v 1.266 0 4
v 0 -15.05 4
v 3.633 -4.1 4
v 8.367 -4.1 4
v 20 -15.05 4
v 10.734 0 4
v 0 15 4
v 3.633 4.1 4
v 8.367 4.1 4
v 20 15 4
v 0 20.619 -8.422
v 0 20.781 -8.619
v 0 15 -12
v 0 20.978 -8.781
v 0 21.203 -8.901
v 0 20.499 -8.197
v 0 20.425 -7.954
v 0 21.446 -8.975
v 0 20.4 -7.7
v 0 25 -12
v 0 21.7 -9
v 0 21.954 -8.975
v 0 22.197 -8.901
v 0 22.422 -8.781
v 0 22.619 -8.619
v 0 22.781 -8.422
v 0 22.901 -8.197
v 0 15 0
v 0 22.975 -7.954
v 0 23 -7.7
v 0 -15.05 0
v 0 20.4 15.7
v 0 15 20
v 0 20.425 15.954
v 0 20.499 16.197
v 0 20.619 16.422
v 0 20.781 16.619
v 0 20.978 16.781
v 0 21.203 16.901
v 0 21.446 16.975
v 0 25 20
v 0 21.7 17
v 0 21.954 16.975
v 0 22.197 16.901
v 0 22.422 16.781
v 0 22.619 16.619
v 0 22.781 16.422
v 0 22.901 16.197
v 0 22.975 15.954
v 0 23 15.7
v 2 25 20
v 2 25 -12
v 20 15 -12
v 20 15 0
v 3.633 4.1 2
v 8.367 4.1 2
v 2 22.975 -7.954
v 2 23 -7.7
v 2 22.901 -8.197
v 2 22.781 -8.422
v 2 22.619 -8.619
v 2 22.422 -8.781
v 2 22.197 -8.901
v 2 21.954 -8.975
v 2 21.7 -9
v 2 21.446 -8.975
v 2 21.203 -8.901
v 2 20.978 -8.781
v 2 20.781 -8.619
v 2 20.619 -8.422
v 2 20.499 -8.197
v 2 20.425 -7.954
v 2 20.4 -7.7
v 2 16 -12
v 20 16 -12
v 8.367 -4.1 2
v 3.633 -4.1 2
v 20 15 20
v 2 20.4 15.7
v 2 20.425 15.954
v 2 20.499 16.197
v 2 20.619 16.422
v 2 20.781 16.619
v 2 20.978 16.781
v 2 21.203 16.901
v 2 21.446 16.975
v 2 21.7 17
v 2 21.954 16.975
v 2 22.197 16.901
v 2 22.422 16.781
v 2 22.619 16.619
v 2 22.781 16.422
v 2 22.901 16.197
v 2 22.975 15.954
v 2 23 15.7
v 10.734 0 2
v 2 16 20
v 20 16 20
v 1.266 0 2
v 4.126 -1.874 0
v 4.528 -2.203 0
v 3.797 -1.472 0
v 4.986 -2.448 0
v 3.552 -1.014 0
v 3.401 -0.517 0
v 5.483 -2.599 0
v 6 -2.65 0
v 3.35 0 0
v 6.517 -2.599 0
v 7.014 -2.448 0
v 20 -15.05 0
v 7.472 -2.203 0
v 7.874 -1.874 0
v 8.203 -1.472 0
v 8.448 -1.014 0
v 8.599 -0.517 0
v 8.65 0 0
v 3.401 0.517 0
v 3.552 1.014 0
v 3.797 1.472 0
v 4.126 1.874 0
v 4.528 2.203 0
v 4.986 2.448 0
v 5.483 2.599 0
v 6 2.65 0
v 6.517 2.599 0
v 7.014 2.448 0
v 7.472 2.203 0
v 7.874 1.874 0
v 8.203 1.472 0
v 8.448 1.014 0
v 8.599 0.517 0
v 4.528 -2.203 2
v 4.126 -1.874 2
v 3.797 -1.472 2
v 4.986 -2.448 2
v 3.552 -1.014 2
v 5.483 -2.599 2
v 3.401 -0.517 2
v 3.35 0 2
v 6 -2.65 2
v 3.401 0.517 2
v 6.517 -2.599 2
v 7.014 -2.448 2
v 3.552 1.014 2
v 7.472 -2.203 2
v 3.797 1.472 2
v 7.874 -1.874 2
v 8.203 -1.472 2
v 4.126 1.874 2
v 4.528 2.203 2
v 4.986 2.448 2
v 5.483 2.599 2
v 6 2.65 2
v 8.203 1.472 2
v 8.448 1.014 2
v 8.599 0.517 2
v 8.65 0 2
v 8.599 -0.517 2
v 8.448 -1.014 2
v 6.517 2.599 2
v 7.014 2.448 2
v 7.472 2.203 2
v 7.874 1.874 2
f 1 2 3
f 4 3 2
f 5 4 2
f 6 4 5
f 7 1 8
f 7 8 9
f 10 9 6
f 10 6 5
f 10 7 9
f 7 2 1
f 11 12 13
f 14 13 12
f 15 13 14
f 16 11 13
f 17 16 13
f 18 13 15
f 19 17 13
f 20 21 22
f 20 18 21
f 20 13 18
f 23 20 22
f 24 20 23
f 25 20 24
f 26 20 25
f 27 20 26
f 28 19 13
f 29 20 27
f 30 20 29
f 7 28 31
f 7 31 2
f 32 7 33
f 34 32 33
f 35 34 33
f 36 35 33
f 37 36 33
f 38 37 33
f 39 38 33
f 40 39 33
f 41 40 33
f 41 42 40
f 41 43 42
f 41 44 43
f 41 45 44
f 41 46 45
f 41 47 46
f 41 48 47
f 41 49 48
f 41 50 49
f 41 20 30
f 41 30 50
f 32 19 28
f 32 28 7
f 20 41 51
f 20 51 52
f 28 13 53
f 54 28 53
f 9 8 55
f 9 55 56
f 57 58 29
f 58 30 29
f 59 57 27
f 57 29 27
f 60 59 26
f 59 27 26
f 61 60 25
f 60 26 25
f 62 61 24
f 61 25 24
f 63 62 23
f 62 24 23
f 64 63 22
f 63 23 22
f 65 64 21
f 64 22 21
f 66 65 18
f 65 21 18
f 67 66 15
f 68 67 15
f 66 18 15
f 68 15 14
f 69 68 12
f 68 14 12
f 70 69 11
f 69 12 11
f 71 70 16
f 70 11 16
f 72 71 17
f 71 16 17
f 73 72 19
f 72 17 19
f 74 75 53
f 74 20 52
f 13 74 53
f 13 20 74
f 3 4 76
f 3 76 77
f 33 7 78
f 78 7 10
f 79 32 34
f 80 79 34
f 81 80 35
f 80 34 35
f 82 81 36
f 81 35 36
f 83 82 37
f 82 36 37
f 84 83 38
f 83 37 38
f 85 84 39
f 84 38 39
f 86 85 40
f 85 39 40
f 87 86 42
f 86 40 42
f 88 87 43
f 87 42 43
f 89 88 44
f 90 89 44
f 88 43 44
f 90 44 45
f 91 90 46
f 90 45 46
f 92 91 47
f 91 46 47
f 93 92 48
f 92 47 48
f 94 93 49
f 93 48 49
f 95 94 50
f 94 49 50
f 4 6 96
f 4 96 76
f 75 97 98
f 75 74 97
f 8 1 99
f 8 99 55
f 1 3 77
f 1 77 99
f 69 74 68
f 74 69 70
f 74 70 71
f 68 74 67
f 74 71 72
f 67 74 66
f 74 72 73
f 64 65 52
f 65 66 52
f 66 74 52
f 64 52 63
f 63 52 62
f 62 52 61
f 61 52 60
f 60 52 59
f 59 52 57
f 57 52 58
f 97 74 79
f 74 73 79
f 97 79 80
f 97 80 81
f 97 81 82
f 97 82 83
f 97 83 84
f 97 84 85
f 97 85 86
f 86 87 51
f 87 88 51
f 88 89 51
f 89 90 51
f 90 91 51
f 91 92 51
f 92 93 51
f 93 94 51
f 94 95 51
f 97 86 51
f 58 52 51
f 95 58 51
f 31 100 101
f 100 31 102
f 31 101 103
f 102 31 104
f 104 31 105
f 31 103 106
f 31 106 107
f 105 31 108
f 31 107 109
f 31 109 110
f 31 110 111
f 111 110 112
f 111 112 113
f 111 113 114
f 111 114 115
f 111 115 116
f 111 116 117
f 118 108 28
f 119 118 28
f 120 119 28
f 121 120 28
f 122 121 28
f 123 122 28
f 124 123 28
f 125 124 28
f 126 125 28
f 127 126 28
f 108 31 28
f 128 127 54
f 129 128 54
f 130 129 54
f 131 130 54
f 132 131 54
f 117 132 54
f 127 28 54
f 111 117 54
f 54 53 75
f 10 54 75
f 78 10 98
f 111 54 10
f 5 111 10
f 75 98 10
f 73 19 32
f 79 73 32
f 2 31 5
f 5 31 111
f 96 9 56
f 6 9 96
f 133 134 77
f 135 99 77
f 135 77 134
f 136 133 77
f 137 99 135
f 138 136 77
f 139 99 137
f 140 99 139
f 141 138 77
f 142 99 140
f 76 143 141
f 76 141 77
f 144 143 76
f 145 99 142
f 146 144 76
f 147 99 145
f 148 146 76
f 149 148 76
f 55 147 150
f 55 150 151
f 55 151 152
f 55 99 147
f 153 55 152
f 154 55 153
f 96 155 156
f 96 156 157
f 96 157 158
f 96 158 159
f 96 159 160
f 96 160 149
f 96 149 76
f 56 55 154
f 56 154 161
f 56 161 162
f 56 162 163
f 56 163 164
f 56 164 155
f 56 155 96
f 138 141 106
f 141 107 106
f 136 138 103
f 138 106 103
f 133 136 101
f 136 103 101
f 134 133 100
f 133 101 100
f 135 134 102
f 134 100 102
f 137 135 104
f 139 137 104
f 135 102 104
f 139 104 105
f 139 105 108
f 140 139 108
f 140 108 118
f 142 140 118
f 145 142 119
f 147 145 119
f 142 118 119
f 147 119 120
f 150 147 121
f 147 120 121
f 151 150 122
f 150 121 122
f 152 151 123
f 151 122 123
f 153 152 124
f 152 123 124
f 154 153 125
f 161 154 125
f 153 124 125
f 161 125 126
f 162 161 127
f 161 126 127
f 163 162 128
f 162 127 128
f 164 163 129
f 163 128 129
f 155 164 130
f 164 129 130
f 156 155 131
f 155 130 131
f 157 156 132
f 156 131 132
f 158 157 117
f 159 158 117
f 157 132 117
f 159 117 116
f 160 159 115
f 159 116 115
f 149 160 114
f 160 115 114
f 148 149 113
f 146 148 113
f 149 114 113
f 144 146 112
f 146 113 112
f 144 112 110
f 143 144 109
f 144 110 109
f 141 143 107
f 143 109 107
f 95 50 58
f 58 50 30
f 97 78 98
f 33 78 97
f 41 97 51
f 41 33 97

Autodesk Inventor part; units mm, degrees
ref_plane "YZ Plane" through (0, 0, 0) normal (1, 0, 0) x (0, 1, 0)
ref_plane "XY Plane" through (0, 0, 0) normal (0, 0, 1) x (1, 0, 0)
ref_plane "MountingScrew" through (0, 0, 0) normal (0, 1, 0) x (-1, 0, 0)
ref_plane "Bracketheight" through (0, 15, 0) normal (0, 1, 0) x (-1, 0, 0)
sketch "Sketch1" plane through (0, 0, 0) normal (0, 0, 1) x (1, 0, 0)
  line L0 (0, -15.05) -> (20, -15.05)
  line L1 (20, -15.05) -> (20, 15)
  line L2 (20, 15) -> (0, 15)
  line L3 (0, 15) -> (0, -15.05)
  circle A0 centre (6, 0) radius 2.75 construction
  line L4 (0, -2.75) -> (20, -2.75) construction
  line L5 (3.25, 15) -> (3.25, -15.05) construction
  line L6 (-4, 0) -> (24, 0) construction
  line L7 (0, 21.01) -> (0, -21.06) construction
  line L8 (-4, 15) -> (24, 15) construction
  dimension "d0" = 5.5
  dimension "d1" = 12.3
  dimension "d2" = 3.25
  dimension "d31" = 6
  dimension "d36" = 20
extrude "Extrusion1" add sketch "Sketch1" along normal blind 4
sketch "Sketch2" plane through (0, 0, 4) normal (0, 0, 1) x (1, 0, 0)
  point P0 (0, 0)
  point P1 (6, 0)
hole "Hole1" at (6, 0, 4) direction (0, 0, -1) diameter 5.3 end through all clearance for "Socket Head Cap Screw ISO 4762" size "M5" standard "ISO"
sketch "Sketch5" plane through (0, 15, 0) normal (0, 1, 0) x (1, 0, 0)
  line L0 (0, 12) -> (20, 12)
  line L1 (20, 12) -> (20, -20)
  line L2 (20, -20) -> (0, -20)
  line L3 (0, -20) -> (0, 12)
  line L4 (20, 0) -> (0, 0) construction
  line L5 (20, 0) -> (0, 0) construction
  line L6 (0, 0) -> (0, -4) construction
  line L7 (20, 0) -> (20, -4) construction
  dimension "d2" = 3.25
  dimension "d60" = 20
  dimension "d61" = 12
extrude "Extrusion4" add sketch "Sketch5" along normal blind 1
sketch "Sketch6" plane through (0, -15.05, 0) normal (-1, 0, 0) x (0, 0, 1)
  line L0 (-12, 30.05) -> (0, 30.05) projected
  line L1 (-12, 30.05) -> (20, 30.05)
  line L2 (20, 30.05) -> (20, 40.05)
  line L3 (20, 40.05) -> (-12, 40.05)
  line L4 (-12, 40.05) -> (-12, 30.05)
  line L5 (20, 30.05) -> (20, 31.05) construction
  point P0 (0, 15.05)
  dimension "d37" = 10
extrude "Extrusion5" add sketch "Sketch6" against normal blind 2
sketch "Sketch8" plane through (5.5, 0, 4) normal (0, 0, 1) x (1, 0, 0)
  line L0 (-1.8671, 4.1) -> (2.8671, 4.1)
  line L1 (2.8671, 4.1) -> (5.2343, 0)
  line L2 (5.2343, 0) -> (2.8671, -4.1)
  line L3 (2.8671, -4.1) -> (-1.8671, -4.1)
  line L4 (-1.8671, -4.1) -> (-4.2343, 0)
  line L5 (-4.2343, 0) -> (-1.8671, 4.1)
  point P0 (-5.5, 0)
  point P1 (0.5, 0)
  point P2 (0.5, 0)
  dimension "d42" = 8.2
extrude "Extrusion7" cut sketch "Sketch8" against normal blind 2
sketch "Sketch10" plane through (0, -15.05, 0) normal (-1, 0, 0) x (0, 0, 1)
  line L0 (-7.7, 36.75) -> (15.7, 36.75) construction
  line L1 (-7.7, 35.45) -> (15.7, 35.45)
  line L2 (15.7, 38.05) -> (-7.7, 38.05)
  arc A0 (-7.7, 38.05) -> (-7.7, 35.45) centre (-7.7, 36.75) ccw
  arc A1 (15.7, 35.45) -> (15.7, 38.05) centre (15.7, 36.75) ccw
  line L3 (-12, 30.05) -> (-12, 40.05) projected
  line L4 (0, 30.05) -> (0, 0) projected
  line L5 (0, 30.05) -> (0, 0) projected
  line L6 (20, 40.05) -> (-12, 40.05) projected
  line L7 (20, 30.05) -> (20, 40.05) projected
  point P0 (0, 15.05)
  point P1 (4, 36.75)
  point P2 (-12, 35.05)
  dimension "d55" = 2.6
  dimension "d59" = 2
  dimension "d63" = 4.3
  dimension "d64" = 4.3
extrude "Extrusion9" cut sketch "Sketch10" against normal through all
sketch "Sketch7" plane through (0, 15, 0) normal (0, -1, 0) x (1, 0, 0)
  line L0 (20, 4) -> (0, 4) projected
  line L1 (0, 4) -> (0, 20) projected
  line L2 (20, 4) -> (0, 4)
  line L3 (0, 4) -> (0, 20)
  line L4 (0, 20) -> (20, 20)
  line L5 (20, 20) -> (20, 4)
  point P0 (0, 0)
  dimension "d45" = 5.1
  dimension "d16" = 2.5
  dimension "d17" = 4.25
  dimension "d18" = 8
sketch "Sketch4" plane through (25.5, -5.5, 0) normal (1, 0, 0) x (0, 0, -1)
  line L0 (-5.45, 24.0278) -> (-8, 22.5555)
  line L1 (-8, 22.5555) -> (-10.55, 24.0278)
  line L2 (-10.55, 24.0278) -> (-10.55, 26.9722)
  line L3 (-10.55, 26.9722) -> (-8, 28.4445)
  line L4 (-8, 28.4445) -> (-5.45, 26.9722)
  line L5 (-5.45, 26.9722) -> (-5.45, 24.0278)
  point P0 (0, 5.5)
  point P1 (-8, 25.5)
  point P2 (-8, 25.5)
  dimension "d28" = 5.1
equation "\"d36\" = Schraubenlaenge"
equation "\"d64\" = d63"
equation "\"Schraubenlaenge\" = 20"
properties part number "Enoder_Mount1"
